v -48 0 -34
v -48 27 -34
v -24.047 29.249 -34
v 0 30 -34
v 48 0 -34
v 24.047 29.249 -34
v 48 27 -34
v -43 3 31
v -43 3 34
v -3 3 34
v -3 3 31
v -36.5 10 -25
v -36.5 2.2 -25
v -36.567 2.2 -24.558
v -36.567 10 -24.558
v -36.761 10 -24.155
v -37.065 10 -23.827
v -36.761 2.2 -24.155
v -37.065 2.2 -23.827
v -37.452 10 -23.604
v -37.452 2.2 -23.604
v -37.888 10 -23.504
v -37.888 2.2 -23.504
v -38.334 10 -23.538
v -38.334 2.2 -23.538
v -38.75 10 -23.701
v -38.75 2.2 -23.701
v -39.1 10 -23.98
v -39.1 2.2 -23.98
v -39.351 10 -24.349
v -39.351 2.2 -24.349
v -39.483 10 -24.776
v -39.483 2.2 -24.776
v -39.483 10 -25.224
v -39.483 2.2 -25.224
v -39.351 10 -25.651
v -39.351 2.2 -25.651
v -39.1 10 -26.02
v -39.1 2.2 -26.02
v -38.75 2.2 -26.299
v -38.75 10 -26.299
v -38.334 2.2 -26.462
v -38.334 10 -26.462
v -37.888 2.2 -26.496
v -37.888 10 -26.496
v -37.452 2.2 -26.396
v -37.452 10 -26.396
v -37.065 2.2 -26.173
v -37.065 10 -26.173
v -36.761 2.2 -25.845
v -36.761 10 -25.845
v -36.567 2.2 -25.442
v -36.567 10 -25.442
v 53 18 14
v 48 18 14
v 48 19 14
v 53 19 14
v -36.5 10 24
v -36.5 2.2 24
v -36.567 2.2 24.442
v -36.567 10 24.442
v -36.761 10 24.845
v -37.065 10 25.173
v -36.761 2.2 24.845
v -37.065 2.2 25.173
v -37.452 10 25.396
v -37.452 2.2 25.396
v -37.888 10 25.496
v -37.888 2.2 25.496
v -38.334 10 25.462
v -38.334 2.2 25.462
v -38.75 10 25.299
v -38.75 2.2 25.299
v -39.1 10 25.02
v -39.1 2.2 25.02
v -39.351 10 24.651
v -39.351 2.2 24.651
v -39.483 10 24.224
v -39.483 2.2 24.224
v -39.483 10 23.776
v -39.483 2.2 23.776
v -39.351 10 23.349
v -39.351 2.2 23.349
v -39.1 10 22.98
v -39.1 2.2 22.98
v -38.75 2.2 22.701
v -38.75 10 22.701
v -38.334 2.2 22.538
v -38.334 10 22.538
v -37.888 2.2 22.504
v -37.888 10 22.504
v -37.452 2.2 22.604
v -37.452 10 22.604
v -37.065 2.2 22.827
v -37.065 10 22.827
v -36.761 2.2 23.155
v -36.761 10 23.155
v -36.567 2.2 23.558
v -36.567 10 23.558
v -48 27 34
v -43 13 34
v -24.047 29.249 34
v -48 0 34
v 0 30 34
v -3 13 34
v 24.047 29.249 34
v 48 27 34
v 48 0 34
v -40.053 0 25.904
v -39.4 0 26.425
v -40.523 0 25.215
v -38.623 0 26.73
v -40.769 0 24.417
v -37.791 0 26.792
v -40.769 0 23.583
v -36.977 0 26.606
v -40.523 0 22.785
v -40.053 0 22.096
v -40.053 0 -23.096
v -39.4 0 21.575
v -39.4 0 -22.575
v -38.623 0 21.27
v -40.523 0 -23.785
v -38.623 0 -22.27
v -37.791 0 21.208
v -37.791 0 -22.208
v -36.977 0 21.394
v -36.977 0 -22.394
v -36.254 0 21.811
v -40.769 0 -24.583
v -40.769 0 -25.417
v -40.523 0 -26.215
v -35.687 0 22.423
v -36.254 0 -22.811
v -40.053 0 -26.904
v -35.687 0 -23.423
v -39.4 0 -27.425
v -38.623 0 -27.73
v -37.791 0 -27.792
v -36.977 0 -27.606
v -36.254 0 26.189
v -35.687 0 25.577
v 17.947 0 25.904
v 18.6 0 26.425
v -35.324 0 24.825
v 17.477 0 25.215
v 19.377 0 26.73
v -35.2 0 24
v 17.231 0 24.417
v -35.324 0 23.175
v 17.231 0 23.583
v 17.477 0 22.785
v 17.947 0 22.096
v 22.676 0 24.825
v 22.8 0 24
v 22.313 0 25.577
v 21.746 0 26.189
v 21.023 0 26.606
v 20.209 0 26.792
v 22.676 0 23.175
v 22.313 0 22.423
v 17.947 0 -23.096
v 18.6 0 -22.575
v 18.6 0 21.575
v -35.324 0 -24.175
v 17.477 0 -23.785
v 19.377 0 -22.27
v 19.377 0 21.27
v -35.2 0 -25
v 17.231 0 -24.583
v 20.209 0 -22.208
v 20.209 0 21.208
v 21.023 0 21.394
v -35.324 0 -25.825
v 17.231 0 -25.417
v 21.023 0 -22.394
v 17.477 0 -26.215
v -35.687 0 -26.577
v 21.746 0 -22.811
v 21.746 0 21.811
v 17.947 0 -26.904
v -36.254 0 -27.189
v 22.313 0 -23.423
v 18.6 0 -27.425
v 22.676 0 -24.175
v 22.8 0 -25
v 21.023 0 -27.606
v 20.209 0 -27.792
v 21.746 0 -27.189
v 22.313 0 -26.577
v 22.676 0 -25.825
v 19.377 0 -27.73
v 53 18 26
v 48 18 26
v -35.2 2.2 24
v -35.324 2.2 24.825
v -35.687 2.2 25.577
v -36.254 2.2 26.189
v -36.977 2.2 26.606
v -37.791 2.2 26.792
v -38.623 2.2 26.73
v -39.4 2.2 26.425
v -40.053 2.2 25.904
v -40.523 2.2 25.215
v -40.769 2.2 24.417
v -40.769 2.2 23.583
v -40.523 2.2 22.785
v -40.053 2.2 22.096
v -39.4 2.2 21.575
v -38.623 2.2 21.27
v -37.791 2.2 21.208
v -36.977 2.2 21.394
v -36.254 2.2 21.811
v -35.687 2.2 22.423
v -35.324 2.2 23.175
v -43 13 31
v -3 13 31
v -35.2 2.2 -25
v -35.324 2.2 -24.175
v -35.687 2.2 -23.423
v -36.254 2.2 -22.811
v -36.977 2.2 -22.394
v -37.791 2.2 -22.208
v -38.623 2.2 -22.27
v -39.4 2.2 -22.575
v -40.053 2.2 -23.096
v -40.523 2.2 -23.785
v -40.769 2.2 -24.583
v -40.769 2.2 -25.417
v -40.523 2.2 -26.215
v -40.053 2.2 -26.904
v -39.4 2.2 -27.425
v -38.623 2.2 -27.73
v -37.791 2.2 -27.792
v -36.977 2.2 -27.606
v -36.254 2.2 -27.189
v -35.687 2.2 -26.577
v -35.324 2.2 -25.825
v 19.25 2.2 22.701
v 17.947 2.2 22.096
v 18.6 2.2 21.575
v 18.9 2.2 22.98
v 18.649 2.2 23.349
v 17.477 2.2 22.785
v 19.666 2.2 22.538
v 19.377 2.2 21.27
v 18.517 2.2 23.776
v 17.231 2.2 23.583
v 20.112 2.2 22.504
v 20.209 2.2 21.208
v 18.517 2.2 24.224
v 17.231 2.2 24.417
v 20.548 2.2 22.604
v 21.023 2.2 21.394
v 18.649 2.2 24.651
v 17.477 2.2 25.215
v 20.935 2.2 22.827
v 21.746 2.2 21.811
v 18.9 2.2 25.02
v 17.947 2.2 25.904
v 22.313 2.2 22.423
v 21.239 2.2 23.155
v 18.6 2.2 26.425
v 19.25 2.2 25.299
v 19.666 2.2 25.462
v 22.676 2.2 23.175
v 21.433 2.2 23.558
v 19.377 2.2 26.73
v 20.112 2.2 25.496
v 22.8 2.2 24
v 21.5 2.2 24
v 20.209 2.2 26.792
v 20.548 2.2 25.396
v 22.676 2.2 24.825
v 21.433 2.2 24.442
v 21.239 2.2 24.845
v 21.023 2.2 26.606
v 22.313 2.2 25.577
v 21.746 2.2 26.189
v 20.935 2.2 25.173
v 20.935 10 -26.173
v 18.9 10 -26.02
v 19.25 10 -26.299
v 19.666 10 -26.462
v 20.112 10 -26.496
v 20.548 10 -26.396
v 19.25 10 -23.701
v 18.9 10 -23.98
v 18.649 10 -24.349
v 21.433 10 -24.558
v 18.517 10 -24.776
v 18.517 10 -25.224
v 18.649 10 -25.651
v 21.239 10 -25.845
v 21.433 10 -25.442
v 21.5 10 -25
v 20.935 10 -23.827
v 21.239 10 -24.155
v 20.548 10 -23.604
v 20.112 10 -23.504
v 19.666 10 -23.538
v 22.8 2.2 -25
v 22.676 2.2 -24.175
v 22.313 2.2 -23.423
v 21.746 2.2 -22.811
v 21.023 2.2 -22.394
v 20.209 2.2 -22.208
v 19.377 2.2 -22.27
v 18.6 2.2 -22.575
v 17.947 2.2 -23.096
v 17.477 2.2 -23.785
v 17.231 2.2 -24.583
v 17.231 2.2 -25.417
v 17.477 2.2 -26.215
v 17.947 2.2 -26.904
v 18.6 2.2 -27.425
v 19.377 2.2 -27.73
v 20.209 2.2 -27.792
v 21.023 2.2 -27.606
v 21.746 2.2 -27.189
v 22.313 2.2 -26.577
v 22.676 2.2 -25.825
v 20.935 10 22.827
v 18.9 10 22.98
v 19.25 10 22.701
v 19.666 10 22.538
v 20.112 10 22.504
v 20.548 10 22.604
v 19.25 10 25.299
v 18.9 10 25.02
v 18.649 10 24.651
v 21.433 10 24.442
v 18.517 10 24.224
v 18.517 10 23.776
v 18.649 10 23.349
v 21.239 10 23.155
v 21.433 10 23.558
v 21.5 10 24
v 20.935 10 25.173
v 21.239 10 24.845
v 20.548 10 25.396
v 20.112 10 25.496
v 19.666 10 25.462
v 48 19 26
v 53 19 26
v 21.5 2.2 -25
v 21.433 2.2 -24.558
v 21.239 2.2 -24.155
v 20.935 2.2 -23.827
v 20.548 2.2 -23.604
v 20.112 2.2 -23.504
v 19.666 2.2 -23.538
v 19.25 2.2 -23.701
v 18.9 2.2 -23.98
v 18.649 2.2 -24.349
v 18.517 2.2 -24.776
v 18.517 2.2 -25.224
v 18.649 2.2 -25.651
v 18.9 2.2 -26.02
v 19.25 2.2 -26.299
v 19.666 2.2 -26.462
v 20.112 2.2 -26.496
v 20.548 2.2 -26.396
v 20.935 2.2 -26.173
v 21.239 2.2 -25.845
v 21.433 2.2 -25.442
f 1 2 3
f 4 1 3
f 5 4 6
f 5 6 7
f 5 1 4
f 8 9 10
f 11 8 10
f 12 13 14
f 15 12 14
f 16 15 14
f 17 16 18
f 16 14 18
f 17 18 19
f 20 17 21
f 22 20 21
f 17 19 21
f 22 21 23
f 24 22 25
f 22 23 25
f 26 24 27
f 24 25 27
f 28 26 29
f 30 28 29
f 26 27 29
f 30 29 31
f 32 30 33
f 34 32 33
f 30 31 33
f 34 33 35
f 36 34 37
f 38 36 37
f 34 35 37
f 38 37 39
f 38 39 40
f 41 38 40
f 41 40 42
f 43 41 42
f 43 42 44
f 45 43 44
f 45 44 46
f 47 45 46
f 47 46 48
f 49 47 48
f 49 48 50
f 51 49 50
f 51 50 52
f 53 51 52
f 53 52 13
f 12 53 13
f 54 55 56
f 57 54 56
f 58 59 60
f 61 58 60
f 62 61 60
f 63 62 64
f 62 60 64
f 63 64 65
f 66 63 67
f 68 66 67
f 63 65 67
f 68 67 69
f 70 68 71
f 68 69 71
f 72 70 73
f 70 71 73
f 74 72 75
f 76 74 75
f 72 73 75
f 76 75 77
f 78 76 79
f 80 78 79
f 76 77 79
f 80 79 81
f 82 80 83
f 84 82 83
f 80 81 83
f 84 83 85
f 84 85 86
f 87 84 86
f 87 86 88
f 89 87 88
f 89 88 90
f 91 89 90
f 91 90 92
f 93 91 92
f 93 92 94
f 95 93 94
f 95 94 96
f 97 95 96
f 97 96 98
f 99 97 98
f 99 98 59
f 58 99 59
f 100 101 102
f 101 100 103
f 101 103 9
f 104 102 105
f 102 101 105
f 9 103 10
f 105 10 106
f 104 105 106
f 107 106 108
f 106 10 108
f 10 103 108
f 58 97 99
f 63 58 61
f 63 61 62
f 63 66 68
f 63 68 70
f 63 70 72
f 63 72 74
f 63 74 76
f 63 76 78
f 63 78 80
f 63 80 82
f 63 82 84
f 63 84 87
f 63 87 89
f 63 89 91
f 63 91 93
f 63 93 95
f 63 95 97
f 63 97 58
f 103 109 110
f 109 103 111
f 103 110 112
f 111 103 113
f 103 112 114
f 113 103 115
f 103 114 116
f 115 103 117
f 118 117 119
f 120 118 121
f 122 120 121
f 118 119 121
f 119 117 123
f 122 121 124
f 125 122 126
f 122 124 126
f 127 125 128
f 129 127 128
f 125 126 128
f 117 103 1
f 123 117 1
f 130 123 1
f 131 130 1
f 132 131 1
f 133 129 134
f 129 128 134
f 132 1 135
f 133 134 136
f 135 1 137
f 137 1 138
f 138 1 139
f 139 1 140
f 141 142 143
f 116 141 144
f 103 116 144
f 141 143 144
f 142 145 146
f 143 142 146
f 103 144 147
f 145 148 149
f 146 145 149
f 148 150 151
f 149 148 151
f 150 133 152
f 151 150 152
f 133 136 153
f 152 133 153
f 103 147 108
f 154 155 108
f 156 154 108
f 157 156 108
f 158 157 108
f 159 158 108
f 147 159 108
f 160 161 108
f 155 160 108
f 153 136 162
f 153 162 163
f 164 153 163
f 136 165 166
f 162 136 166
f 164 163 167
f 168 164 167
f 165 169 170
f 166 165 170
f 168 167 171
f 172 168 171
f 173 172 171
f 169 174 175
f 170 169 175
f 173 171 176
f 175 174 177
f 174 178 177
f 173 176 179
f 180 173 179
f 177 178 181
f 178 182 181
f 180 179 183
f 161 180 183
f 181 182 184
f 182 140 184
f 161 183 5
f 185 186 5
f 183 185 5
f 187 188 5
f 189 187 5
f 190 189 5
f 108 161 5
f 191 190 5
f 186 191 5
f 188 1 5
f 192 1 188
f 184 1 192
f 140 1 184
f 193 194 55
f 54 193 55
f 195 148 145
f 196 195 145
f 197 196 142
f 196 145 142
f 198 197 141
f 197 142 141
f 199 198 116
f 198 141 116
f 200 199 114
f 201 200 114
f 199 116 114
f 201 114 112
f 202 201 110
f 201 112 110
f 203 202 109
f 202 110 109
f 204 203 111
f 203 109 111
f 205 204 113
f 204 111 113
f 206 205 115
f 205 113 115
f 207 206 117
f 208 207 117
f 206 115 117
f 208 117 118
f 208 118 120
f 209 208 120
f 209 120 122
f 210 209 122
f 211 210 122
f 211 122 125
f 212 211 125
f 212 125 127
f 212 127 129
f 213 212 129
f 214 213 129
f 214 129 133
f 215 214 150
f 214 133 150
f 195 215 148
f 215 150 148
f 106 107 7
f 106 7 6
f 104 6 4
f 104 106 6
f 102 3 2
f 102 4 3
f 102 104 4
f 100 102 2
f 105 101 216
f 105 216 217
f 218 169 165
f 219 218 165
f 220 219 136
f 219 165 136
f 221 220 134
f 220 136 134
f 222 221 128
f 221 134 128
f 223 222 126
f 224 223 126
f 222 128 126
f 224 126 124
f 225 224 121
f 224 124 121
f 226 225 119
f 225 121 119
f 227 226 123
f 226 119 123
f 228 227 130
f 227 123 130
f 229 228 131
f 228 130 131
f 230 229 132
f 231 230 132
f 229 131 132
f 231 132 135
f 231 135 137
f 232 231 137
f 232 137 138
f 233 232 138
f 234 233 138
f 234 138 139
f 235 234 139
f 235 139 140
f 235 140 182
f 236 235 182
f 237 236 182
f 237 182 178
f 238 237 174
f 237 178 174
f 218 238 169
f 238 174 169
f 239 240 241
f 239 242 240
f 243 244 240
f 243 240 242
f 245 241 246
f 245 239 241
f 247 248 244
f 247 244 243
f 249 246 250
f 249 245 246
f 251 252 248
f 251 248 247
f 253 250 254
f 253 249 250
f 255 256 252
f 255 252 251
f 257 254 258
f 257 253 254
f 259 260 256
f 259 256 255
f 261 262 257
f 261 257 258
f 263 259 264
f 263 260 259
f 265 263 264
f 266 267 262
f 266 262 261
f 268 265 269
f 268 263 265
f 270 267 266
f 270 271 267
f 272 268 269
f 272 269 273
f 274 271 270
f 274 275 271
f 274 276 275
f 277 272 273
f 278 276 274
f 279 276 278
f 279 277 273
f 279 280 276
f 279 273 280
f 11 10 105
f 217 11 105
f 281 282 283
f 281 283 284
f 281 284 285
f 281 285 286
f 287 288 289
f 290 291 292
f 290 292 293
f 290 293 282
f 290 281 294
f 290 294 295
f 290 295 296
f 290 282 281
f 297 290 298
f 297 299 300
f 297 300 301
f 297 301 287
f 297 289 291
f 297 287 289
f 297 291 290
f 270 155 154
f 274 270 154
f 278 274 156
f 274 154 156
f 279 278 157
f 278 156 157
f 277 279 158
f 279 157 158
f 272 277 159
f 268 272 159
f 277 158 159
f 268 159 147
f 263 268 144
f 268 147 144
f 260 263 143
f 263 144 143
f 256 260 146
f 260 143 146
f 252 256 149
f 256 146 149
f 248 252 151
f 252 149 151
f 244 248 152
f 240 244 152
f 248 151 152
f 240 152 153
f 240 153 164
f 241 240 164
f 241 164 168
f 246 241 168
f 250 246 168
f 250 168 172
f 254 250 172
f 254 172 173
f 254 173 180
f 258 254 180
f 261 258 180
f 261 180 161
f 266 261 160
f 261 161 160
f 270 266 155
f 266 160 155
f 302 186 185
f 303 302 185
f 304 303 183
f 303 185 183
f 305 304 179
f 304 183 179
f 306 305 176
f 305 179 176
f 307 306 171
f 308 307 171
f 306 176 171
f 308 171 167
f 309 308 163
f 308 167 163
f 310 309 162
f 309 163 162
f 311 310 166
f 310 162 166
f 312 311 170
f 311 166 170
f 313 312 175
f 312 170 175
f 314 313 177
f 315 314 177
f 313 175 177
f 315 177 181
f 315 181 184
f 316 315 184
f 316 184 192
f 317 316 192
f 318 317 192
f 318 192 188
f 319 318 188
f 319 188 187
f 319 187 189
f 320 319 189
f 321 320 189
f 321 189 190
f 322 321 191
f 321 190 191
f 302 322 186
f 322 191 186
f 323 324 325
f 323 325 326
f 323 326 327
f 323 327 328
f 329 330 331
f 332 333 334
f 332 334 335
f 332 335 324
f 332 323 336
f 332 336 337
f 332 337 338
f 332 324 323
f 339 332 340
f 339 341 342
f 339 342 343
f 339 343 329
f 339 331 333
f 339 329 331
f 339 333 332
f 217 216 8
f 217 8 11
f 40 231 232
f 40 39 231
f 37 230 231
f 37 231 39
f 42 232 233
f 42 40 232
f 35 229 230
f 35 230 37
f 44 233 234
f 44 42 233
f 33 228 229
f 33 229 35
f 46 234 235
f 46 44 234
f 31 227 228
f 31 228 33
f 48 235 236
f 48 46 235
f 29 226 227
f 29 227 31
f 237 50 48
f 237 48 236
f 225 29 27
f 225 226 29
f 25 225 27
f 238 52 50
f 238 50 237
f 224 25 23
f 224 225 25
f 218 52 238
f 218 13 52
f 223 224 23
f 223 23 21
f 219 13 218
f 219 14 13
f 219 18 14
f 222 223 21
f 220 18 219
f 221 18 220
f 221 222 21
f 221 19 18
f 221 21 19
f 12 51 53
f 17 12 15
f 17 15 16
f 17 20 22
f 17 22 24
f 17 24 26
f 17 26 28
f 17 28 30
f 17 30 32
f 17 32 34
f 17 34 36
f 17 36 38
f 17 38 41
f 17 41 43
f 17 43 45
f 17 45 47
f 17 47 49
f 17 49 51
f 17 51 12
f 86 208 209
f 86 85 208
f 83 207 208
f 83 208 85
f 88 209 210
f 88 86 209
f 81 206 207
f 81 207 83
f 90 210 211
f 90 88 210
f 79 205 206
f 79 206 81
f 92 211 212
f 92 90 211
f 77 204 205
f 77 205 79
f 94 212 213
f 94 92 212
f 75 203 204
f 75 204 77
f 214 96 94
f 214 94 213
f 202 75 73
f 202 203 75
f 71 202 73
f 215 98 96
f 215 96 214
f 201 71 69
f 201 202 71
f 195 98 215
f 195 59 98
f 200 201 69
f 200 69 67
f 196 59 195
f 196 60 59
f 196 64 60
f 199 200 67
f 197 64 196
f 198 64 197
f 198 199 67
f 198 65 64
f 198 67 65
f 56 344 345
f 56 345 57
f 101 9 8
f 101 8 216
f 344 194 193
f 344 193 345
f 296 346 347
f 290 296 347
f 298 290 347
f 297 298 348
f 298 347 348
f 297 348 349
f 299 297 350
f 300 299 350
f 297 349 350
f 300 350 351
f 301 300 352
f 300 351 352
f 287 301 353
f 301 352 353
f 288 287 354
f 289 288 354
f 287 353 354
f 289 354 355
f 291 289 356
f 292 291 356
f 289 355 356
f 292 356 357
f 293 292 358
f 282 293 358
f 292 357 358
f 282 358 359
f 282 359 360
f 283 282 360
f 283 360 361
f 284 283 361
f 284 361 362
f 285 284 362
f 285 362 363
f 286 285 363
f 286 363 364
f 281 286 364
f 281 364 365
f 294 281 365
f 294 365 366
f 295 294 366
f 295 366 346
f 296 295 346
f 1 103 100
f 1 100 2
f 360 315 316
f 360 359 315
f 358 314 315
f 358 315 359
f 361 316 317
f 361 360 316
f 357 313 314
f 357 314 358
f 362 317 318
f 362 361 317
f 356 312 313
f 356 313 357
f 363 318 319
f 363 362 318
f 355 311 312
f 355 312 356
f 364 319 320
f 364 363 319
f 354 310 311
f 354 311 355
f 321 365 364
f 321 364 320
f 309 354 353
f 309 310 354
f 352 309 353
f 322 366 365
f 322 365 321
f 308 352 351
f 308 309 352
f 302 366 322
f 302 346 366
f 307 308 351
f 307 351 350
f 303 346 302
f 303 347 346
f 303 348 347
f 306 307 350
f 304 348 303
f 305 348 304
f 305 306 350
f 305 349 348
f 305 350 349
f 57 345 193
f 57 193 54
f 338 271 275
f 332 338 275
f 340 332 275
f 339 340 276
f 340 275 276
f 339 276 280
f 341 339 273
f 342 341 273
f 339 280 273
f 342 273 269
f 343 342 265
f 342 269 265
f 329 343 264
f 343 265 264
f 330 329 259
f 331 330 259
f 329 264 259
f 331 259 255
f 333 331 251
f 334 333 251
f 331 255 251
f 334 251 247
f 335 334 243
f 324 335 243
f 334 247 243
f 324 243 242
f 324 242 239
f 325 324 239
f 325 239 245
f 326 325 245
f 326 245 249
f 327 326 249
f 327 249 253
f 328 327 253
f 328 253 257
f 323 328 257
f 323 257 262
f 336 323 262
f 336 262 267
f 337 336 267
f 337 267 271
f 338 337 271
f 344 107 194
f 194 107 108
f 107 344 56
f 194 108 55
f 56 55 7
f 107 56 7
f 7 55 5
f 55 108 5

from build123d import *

# Parameters (mm, degrees)
SKETCH1_W           = 96
SKETCH1_H           = 68
BOSS_EXTRUDE1_DEPTH = 30
CUT_EXTRUDE1_DEPTH  = 89.475985442
SKETCH3_W           = 40
SKETCH3_H           = 10
CUT_EXTRUDE2_DEPTH  = 3
SKETCH4_W           = 12
SKETCH4_H           = 1
BOSS_EXTRUDE2_DEPTH = 5
SKETCH5_R           = 2.8
SKETCH5_R_2         = 1.5
CUT_EXTRUDE3_DEPTH  = 2.2
SKETCH5_2_R         = 1.5
CUT_EXTRUDE4_DEPTH  = 10


with BuildPart() as part:
    # Sketch1 → Boss-Extrude1 (new body)
    with BuildSketch(Plane(origin=(0, 0, 0), x_dir=(1, 0, 0), z_dir=(0, 1, 0))):
        Rectangle(SKETCH1_W, SKETCH1_H)
    extrude(amount=BOSS_EXTRUDE1_DEPTH)

    # Sketch2 → Cut-Extrude1 (cut, through all)
    with BuildSketch(Plane.XY.offset(34)):
        with BuildLine():
            Line((-48, 27), (-48, 41.348675948))
            Line((-48, 41.348675948), (48, 41.348675948))
            Line((48, 41.348675948), (48, 27))
            ThreePointArc((48, 27), (0, 30), (-48, 27))
        make_face()
    extrude(amount=-CUT_EXTRUDE1_DEPTH, mode=Mode.SUBTRACT)

    # Sketch3 → Cut-Extrude2 (cut)
    with BuildSketch(Plane.XY.offset(34)):
        with Locations((-23, 8)):
            Rectangle(SKETCH3_W, SKETCH3_H)
    extrude(amount=-CUT_EXTRUDE2_DEPTH, mode=Mode.SUBTRACT)

    # Sketch4 → Boss-Extrude2 (add)
    with BuildSketch(Plane(origin=(48, 0, 0), x_dir=(0, 0, -1), z_dir=(1, 0, 0))):
        with Locations((-20, 18.5)):
            Rectangle(SKETCH4_W, SKETCH4_H)
    extrude(amount=BOSS_EXTRUDE2_DEPTH)

    # Sketch5 → Cut-Extrude3 (cut)
    # profile 1 of 4: a face of its own
    with BuildSketch(Plane.XZ):
        with Locations((-38, 24)):
            Circle(SKETCH5_R)
        with Locations((-38, 24)):
            Circle(SKETCH5_R_2, mode=Mode.SUBTRACT)
    # profile 2 of 4: a face of its own
    with BuildSketch(Plane.XZ):
        with Locations((20, 24)):
            Circle(SKETCH5_R)
        with Locations((20, 24)):
            Circle(SKETCH5_R_2, mode=Mode.SUBTRACT)
    # profile 3 of 4: a face of its own
    with BuildSketch(Plane.XZ):
        with Locations((20, -25)):
            Circle(SKETCH5_R)
        with Locations((20, -25)):
            Circle(SKETCH5_R_2, mode=Mode.SUBTRACT)
    # profile 4 of 4: a face of its own
    with BuildSketch(Plane.XZ):
        with Locations((-38, -25)):
            Circle(SKETCH5_R)
        with Locations((-38, -25)):
            Circle(SKETCH5_R_2, mode=Mode.SUBTRACT)
    extrude(amount=-CUT_EXTRUDE3_DEPTH, mode=Mode.SUBTRACT)

    # Sketch5<2> → Cut-Extrude4 (cut)
    with BuildSketch(Plane.XZ):
        with Locations((-38, 24)):
            Circle(SKETCH5_2_R)
        with Locations((20, 24)):
            Circle(SKETCH5_2_R)
        with Locations((20, -25)):
            Circle(SKETCH5_2_R)
        with Locations((-38, -25)):
            Circle(SKETCH5_2_R)
    extrude(amount=-CUT_EXTRUDE4_DEPTH, mode=Mode.SUBTRACT)


solid = part.part
